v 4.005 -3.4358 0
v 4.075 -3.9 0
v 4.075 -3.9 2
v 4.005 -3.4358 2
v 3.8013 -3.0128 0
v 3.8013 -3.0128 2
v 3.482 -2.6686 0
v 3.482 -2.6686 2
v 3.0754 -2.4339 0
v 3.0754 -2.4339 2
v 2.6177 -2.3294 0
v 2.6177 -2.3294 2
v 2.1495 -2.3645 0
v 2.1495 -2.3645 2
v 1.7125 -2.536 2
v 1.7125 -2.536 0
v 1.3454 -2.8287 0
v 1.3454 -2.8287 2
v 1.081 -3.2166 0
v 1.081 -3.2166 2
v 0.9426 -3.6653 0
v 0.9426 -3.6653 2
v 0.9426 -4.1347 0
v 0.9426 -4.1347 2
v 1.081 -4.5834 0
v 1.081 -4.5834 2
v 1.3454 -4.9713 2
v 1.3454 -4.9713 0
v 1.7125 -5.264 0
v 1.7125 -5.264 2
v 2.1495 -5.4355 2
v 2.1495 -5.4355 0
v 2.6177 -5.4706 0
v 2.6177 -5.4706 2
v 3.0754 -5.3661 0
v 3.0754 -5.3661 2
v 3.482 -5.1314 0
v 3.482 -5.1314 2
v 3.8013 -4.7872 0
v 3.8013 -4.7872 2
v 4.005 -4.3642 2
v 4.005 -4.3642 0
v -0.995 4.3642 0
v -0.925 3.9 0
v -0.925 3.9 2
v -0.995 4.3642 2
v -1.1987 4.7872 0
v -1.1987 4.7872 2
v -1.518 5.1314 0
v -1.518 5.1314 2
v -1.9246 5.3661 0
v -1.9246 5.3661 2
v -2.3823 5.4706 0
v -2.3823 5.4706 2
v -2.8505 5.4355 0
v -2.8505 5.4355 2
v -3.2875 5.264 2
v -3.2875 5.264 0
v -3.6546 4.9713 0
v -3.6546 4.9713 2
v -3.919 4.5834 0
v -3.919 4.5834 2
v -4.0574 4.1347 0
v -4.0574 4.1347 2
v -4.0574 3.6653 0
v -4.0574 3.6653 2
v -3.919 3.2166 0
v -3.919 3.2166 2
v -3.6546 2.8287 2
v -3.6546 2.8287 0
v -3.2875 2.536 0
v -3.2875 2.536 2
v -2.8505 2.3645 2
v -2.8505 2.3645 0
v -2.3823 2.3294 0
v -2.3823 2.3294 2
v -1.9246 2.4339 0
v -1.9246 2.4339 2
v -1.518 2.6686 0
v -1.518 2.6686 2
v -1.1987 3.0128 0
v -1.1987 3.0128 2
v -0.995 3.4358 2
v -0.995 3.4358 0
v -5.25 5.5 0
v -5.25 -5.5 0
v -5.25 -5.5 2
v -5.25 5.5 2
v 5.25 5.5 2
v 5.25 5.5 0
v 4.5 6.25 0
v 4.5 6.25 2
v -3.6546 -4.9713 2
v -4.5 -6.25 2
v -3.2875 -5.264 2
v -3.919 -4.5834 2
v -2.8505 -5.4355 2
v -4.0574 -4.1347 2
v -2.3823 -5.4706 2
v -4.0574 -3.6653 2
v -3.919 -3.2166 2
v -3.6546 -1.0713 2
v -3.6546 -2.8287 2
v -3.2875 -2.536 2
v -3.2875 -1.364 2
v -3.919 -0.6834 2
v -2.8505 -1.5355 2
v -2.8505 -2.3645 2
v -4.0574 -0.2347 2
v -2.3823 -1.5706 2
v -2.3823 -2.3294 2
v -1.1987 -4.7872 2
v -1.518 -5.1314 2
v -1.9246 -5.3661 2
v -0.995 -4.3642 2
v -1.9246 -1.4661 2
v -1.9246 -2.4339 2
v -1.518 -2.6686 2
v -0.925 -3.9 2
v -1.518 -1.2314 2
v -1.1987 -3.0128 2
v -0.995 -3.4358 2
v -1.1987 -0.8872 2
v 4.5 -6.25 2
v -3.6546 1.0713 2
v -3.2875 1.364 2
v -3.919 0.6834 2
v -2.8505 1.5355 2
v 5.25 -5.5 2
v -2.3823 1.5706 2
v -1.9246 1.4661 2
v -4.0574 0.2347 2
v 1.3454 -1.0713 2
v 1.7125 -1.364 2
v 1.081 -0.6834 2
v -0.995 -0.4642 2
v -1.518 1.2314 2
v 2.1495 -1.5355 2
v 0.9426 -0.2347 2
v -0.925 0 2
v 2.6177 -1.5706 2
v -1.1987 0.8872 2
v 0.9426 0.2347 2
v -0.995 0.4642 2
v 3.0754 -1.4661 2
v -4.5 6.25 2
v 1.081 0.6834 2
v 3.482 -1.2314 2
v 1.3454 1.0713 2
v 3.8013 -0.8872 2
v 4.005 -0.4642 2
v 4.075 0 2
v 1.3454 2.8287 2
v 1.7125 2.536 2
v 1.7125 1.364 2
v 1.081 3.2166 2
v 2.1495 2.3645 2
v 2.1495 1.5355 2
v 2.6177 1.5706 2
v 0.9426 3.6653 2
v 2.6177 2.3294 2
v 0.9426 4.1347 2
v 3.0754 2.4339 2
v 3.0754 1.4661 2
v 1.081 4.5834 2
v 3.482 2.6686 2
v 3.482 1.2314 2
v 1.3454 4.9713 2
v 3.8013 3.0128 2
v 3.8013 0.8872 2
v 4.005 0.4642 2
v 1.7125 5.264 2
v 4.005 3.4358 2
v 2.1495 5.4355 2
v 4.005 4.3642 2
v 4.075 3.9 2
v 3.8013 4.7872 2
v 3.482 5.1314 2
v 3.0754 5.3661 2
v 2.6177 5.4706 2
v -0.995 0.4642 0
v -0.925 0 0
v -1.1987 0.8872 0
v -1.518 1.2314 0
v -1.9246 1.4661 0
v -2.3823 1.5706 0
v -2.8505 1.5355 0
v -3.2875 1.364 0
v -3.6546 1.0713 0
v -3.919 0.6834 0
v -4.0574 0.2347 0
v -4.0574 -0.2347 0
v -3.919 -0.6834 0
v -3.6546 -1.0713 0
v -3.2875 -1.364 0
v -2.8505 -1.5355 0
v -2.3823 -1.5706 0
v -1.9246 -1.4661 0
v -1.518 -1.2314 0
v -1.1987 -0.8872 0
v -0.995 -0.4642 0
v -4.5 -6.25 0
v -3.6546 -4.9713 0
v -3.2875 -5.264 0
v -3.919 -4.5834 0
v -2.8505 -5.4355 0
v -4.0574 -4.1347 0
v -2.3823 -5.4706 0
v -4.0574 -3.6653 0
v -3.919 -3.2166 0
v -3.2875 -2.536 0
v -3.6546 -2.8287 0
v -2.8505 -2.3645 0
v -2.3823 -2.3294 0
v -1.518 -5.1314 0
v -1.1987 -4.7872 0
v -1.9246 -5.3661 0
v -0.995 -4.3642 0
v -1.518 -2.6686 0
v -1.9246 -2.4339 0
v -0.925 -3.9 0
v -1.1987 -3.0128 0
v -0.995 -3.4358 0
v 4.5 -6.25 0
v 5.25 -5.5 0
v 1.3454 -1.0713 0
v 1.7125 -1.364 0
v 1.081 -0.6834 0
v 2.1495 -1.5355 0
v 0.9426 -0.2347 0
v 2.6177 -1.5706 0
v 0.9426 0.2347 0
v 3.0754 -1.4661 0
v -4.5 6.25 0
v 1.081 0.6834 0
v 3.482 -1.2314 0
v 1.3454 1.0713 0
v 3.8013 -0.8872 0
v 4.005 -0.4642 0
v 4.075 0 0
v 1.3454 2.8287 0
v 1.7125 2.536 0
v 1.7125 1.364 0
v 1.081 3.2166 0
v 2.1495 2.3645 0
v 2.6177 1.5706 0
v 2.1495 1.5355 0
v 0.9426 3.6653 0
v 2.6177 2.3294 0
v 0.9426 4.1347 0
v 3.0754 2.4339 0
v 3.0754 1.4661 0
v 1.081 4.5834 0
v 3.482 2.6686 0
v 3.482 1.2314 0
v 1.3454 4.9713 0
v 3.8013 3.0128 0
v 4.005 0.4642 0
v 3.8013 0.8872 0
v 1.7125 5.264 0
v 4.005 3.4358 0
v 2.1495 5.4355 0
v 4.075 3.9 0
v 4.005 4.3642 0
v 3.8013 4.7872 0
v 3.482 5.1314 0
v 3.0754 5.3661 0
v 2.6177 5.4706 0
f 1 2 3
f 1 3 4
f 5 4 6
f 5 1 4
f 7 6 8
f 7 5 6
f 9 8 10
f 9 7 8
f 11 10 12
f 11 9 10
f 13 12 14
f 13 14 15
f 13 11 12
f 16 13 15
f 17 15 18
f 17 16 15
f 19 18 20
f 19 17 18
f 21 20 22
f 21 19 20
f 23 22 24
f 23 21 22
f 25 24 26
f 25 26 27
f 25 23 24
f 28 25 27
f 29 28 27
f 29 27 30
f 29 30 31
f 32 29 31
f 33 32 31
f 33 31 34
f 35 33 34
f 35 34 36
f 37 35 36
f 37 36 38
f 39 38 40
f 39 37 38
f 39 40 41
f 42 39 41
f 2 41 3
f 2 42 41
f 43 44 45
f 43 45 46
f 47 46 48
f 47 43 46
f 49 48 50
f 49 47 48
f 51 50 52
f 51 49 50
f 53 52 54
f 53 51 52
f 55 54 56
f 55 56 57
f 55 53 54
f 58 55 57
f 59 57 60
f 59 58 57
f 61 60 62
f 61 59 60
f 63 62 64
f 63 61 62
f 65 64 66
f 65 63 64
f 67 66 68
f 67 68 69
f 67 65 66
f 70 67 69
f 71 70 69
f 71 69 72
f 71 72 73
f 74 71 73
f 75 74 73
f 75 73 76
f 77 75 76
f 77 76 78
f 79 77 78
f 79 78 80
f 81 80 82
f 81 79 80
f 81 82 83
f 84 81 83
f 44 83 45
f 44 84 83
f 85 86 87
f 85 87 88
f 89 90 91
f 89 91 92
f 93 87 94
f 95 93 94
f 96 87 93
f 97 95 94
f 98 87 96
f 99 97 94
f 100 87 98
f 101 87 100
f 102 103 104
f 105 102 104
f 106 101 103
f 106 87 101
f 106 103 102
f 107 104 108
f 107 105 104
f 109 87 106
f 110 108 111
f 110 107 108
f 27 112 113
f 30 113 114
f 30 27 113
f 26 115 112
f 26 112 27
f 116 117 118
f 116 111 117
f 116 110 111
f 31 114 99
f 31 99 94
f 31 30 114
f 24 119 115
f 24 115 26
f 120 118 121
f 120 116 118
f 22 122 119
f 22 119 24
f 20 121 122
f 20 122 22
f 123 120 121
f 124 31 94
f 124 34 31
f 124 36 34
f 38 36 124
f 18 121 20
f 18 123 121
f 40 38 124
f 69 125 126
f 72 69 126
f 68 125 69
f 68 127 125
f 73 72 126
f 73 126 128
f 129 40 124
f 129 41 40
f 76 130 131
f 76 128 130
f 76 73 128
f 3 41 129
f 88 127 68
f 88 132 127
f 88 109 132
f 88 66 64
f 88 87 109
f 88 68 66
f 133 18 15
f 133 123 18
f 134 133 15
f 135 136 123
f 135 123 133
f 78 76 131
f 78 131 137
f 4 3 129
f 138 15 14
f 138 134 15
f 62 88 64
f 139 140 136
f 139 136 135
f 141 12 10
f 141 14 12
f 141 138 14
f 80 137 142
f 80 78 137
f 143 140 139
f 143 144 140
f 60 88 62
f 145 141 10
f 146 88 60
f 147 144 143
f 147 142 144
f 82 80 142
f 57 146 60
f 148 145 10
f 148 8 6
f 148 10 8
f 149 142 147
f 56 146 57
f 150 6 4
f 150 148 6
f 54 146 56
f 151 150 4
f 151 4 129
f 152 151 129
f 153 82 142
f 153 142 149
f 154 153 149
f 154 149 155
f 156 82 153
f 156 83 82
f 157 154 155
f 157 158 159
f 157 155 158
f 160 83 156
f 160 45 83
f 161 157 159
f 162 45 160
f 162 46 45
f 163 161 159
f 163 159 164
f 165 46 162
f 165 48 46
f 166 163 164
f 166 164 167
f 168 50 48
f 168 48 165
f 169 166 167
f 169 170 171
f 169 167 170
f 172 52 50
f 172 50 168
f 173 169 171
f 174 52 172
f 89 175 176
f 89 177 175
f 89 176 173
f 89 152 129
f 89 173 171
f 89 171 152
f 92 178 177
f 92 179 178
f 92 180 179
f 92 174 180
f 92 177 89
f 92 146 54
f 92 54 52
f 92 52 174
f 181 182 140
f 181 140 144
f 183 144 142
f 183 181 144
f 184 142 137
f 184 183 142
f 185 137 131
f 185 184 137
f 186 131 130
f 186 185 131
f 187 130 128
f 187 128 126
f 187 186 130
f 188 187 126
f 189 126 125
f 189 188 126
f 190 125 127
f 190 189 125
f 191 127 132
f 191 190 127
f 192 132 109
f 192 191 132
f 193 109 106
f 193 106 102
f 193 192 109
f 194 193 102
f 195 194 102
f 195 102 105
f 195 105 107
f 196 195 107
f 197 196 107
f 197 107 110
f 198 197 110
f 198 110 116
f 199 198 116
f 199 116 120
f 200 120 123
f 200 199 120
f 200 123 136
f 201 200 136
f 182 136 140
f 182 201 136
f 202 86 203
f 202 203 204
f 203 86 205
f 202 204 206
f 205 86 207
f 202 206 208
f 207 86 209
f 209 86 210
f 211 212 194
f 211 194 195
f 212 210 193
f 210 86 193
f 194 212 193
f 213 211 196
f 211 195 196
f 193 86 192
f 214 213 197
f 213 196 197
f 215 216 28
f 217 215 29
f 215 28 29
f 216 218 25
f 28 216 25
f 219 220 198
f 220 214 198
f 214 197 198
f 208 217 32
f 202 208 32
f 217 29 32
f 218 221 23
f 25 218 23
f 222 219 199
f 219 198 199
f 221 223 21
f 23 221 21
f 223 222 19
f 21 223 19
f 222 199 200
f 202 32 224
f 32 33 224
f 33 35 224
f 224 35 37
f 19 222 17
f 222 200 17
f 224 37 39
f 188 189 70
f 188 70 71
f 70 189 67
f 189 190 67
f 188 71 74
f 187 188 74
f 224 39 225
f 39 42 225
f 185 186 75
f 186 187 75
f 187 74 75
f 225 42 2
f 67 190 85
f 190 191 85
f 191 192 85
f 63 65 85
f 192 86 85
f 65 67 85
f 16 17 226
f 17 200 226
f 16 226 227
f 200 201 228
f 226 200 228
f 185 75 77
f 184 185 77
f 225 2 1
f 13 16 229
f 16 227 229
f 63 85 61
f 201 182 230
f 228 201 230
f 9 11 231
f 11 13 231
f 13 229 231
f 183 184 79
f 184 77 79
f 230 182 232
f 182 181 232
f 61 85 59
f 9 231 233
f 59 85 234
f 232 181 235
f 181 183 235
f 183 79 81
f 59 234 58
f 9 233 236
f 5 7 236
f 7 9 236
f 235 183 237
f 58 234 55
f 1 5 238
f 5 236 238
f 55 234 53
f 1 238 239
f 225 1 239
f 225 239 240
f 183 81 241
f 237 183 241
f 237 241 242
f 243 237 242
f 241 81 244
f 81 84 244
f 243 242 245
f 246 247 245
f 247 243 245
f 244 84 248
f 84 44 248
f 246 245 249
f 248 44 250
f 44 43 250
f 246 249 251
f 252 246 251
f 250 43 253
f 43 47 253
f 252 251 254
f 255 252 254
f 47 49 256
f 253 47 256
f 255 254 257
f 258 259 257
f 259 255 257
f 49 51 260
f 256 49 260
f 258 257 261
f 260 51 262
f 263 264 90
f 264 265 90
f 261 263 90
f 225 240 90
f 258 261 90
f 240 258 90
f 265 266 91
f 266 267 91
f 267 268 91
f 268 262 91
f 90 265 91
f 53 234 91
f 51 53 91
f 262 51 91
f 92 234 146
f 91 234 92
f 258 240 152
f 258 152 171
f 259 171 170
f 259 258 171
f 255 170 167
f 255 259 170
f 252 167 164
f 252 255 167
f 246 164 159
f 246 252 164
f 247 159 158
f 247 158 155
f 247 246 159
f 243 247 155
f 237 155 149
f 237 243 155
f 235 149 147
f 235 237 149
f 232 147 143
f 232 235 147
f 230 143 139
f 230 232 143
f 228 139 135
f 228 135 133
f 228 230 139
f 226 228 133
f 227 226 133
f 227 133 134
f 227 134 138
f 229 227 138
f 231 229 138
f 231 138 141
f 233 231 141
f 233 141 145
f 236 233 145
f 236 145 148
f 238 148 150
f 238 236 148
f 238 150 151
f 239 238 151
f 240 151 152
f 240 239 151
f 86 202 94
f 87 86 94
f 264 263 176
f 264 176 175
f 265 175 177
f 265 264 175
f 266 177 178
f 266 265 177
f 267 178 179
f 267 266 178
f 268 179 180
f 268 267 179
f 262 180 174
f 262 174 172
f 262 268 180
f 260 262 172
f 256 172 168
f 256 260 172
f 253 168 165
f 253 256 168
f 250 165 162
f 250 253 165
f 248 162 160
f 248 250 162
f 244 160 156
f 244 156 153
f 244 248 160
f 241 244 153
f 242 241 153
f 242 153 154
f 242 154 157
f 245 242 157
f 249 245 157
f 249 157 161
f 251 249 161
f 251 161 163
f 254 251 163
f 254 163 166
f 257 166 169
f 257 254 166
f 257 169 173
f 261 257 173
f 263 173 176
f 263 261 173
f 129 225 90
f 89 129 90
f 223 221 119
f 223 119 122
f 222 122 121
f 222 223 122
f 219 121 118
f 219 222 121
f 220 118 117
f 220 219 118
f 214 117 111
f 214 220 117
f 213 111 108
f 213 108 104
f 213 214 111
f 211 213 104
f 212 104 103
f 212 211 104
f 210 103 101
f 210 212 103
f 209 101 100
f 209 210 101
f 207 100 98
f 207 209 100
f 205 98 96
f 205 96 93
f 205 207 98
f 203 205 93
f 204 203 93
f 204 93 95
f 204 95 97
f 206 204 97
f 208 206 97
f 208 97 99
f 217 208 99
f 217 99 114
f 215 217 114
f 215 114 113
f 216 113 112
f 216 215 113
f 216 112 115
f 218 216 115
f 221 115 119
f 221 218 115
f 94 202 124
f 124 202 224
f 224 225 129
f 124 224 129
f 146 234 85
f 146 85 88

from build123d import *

# Parameters (mm, degrees)
F0_W     = 10.5
F0_H     = 12.5
F0_R     = 1.575
F1_DEPTH = 2
F2_SIZE  = 0.75


with BuildPart() as f1:
    # F0 (on Top) → F1 (new body)
    with BuildSketch(Plane.XY):
        Rectangle(F0_W, F0_H)
        with Locations((-2.5, -3.9)):
            Circle(F0_R, mode=Mode.SUBTRACT)
        with Locations((2.5, -3.9)):
            Circle(F0_R, mode=Mode.SUBTRACT)
        with Locations((-2.5, 0)):
            Circle(F0_R, mode=Mode.SUBTRACT)
        with Locations((-2.5, 3.9)):
            Circle(F0_R, mode=Mode.SUBTRACT)
        with Locations((2.5, 0)):
            Circle(F0_R, mode=Mode.SUBTRACT)
        with Locations((2.5, 3.9)):
            Circle(F0_R, mode=Mode.SUBTRACT)
    extrude(amount=F1_DEPTH)

    # F2
    f2_edges = [f1.edges().sort_by_distance(p)[0] for p in [
        (-5.25, 6.25, 1),
        (5.25, 6.25, 1),
        (5.25, -6.25, 1),
        (-5.25, -6.25, 1),
    ]]
    chamfer(f2_edges, length=F2_SIZE)


solid = f1.part
